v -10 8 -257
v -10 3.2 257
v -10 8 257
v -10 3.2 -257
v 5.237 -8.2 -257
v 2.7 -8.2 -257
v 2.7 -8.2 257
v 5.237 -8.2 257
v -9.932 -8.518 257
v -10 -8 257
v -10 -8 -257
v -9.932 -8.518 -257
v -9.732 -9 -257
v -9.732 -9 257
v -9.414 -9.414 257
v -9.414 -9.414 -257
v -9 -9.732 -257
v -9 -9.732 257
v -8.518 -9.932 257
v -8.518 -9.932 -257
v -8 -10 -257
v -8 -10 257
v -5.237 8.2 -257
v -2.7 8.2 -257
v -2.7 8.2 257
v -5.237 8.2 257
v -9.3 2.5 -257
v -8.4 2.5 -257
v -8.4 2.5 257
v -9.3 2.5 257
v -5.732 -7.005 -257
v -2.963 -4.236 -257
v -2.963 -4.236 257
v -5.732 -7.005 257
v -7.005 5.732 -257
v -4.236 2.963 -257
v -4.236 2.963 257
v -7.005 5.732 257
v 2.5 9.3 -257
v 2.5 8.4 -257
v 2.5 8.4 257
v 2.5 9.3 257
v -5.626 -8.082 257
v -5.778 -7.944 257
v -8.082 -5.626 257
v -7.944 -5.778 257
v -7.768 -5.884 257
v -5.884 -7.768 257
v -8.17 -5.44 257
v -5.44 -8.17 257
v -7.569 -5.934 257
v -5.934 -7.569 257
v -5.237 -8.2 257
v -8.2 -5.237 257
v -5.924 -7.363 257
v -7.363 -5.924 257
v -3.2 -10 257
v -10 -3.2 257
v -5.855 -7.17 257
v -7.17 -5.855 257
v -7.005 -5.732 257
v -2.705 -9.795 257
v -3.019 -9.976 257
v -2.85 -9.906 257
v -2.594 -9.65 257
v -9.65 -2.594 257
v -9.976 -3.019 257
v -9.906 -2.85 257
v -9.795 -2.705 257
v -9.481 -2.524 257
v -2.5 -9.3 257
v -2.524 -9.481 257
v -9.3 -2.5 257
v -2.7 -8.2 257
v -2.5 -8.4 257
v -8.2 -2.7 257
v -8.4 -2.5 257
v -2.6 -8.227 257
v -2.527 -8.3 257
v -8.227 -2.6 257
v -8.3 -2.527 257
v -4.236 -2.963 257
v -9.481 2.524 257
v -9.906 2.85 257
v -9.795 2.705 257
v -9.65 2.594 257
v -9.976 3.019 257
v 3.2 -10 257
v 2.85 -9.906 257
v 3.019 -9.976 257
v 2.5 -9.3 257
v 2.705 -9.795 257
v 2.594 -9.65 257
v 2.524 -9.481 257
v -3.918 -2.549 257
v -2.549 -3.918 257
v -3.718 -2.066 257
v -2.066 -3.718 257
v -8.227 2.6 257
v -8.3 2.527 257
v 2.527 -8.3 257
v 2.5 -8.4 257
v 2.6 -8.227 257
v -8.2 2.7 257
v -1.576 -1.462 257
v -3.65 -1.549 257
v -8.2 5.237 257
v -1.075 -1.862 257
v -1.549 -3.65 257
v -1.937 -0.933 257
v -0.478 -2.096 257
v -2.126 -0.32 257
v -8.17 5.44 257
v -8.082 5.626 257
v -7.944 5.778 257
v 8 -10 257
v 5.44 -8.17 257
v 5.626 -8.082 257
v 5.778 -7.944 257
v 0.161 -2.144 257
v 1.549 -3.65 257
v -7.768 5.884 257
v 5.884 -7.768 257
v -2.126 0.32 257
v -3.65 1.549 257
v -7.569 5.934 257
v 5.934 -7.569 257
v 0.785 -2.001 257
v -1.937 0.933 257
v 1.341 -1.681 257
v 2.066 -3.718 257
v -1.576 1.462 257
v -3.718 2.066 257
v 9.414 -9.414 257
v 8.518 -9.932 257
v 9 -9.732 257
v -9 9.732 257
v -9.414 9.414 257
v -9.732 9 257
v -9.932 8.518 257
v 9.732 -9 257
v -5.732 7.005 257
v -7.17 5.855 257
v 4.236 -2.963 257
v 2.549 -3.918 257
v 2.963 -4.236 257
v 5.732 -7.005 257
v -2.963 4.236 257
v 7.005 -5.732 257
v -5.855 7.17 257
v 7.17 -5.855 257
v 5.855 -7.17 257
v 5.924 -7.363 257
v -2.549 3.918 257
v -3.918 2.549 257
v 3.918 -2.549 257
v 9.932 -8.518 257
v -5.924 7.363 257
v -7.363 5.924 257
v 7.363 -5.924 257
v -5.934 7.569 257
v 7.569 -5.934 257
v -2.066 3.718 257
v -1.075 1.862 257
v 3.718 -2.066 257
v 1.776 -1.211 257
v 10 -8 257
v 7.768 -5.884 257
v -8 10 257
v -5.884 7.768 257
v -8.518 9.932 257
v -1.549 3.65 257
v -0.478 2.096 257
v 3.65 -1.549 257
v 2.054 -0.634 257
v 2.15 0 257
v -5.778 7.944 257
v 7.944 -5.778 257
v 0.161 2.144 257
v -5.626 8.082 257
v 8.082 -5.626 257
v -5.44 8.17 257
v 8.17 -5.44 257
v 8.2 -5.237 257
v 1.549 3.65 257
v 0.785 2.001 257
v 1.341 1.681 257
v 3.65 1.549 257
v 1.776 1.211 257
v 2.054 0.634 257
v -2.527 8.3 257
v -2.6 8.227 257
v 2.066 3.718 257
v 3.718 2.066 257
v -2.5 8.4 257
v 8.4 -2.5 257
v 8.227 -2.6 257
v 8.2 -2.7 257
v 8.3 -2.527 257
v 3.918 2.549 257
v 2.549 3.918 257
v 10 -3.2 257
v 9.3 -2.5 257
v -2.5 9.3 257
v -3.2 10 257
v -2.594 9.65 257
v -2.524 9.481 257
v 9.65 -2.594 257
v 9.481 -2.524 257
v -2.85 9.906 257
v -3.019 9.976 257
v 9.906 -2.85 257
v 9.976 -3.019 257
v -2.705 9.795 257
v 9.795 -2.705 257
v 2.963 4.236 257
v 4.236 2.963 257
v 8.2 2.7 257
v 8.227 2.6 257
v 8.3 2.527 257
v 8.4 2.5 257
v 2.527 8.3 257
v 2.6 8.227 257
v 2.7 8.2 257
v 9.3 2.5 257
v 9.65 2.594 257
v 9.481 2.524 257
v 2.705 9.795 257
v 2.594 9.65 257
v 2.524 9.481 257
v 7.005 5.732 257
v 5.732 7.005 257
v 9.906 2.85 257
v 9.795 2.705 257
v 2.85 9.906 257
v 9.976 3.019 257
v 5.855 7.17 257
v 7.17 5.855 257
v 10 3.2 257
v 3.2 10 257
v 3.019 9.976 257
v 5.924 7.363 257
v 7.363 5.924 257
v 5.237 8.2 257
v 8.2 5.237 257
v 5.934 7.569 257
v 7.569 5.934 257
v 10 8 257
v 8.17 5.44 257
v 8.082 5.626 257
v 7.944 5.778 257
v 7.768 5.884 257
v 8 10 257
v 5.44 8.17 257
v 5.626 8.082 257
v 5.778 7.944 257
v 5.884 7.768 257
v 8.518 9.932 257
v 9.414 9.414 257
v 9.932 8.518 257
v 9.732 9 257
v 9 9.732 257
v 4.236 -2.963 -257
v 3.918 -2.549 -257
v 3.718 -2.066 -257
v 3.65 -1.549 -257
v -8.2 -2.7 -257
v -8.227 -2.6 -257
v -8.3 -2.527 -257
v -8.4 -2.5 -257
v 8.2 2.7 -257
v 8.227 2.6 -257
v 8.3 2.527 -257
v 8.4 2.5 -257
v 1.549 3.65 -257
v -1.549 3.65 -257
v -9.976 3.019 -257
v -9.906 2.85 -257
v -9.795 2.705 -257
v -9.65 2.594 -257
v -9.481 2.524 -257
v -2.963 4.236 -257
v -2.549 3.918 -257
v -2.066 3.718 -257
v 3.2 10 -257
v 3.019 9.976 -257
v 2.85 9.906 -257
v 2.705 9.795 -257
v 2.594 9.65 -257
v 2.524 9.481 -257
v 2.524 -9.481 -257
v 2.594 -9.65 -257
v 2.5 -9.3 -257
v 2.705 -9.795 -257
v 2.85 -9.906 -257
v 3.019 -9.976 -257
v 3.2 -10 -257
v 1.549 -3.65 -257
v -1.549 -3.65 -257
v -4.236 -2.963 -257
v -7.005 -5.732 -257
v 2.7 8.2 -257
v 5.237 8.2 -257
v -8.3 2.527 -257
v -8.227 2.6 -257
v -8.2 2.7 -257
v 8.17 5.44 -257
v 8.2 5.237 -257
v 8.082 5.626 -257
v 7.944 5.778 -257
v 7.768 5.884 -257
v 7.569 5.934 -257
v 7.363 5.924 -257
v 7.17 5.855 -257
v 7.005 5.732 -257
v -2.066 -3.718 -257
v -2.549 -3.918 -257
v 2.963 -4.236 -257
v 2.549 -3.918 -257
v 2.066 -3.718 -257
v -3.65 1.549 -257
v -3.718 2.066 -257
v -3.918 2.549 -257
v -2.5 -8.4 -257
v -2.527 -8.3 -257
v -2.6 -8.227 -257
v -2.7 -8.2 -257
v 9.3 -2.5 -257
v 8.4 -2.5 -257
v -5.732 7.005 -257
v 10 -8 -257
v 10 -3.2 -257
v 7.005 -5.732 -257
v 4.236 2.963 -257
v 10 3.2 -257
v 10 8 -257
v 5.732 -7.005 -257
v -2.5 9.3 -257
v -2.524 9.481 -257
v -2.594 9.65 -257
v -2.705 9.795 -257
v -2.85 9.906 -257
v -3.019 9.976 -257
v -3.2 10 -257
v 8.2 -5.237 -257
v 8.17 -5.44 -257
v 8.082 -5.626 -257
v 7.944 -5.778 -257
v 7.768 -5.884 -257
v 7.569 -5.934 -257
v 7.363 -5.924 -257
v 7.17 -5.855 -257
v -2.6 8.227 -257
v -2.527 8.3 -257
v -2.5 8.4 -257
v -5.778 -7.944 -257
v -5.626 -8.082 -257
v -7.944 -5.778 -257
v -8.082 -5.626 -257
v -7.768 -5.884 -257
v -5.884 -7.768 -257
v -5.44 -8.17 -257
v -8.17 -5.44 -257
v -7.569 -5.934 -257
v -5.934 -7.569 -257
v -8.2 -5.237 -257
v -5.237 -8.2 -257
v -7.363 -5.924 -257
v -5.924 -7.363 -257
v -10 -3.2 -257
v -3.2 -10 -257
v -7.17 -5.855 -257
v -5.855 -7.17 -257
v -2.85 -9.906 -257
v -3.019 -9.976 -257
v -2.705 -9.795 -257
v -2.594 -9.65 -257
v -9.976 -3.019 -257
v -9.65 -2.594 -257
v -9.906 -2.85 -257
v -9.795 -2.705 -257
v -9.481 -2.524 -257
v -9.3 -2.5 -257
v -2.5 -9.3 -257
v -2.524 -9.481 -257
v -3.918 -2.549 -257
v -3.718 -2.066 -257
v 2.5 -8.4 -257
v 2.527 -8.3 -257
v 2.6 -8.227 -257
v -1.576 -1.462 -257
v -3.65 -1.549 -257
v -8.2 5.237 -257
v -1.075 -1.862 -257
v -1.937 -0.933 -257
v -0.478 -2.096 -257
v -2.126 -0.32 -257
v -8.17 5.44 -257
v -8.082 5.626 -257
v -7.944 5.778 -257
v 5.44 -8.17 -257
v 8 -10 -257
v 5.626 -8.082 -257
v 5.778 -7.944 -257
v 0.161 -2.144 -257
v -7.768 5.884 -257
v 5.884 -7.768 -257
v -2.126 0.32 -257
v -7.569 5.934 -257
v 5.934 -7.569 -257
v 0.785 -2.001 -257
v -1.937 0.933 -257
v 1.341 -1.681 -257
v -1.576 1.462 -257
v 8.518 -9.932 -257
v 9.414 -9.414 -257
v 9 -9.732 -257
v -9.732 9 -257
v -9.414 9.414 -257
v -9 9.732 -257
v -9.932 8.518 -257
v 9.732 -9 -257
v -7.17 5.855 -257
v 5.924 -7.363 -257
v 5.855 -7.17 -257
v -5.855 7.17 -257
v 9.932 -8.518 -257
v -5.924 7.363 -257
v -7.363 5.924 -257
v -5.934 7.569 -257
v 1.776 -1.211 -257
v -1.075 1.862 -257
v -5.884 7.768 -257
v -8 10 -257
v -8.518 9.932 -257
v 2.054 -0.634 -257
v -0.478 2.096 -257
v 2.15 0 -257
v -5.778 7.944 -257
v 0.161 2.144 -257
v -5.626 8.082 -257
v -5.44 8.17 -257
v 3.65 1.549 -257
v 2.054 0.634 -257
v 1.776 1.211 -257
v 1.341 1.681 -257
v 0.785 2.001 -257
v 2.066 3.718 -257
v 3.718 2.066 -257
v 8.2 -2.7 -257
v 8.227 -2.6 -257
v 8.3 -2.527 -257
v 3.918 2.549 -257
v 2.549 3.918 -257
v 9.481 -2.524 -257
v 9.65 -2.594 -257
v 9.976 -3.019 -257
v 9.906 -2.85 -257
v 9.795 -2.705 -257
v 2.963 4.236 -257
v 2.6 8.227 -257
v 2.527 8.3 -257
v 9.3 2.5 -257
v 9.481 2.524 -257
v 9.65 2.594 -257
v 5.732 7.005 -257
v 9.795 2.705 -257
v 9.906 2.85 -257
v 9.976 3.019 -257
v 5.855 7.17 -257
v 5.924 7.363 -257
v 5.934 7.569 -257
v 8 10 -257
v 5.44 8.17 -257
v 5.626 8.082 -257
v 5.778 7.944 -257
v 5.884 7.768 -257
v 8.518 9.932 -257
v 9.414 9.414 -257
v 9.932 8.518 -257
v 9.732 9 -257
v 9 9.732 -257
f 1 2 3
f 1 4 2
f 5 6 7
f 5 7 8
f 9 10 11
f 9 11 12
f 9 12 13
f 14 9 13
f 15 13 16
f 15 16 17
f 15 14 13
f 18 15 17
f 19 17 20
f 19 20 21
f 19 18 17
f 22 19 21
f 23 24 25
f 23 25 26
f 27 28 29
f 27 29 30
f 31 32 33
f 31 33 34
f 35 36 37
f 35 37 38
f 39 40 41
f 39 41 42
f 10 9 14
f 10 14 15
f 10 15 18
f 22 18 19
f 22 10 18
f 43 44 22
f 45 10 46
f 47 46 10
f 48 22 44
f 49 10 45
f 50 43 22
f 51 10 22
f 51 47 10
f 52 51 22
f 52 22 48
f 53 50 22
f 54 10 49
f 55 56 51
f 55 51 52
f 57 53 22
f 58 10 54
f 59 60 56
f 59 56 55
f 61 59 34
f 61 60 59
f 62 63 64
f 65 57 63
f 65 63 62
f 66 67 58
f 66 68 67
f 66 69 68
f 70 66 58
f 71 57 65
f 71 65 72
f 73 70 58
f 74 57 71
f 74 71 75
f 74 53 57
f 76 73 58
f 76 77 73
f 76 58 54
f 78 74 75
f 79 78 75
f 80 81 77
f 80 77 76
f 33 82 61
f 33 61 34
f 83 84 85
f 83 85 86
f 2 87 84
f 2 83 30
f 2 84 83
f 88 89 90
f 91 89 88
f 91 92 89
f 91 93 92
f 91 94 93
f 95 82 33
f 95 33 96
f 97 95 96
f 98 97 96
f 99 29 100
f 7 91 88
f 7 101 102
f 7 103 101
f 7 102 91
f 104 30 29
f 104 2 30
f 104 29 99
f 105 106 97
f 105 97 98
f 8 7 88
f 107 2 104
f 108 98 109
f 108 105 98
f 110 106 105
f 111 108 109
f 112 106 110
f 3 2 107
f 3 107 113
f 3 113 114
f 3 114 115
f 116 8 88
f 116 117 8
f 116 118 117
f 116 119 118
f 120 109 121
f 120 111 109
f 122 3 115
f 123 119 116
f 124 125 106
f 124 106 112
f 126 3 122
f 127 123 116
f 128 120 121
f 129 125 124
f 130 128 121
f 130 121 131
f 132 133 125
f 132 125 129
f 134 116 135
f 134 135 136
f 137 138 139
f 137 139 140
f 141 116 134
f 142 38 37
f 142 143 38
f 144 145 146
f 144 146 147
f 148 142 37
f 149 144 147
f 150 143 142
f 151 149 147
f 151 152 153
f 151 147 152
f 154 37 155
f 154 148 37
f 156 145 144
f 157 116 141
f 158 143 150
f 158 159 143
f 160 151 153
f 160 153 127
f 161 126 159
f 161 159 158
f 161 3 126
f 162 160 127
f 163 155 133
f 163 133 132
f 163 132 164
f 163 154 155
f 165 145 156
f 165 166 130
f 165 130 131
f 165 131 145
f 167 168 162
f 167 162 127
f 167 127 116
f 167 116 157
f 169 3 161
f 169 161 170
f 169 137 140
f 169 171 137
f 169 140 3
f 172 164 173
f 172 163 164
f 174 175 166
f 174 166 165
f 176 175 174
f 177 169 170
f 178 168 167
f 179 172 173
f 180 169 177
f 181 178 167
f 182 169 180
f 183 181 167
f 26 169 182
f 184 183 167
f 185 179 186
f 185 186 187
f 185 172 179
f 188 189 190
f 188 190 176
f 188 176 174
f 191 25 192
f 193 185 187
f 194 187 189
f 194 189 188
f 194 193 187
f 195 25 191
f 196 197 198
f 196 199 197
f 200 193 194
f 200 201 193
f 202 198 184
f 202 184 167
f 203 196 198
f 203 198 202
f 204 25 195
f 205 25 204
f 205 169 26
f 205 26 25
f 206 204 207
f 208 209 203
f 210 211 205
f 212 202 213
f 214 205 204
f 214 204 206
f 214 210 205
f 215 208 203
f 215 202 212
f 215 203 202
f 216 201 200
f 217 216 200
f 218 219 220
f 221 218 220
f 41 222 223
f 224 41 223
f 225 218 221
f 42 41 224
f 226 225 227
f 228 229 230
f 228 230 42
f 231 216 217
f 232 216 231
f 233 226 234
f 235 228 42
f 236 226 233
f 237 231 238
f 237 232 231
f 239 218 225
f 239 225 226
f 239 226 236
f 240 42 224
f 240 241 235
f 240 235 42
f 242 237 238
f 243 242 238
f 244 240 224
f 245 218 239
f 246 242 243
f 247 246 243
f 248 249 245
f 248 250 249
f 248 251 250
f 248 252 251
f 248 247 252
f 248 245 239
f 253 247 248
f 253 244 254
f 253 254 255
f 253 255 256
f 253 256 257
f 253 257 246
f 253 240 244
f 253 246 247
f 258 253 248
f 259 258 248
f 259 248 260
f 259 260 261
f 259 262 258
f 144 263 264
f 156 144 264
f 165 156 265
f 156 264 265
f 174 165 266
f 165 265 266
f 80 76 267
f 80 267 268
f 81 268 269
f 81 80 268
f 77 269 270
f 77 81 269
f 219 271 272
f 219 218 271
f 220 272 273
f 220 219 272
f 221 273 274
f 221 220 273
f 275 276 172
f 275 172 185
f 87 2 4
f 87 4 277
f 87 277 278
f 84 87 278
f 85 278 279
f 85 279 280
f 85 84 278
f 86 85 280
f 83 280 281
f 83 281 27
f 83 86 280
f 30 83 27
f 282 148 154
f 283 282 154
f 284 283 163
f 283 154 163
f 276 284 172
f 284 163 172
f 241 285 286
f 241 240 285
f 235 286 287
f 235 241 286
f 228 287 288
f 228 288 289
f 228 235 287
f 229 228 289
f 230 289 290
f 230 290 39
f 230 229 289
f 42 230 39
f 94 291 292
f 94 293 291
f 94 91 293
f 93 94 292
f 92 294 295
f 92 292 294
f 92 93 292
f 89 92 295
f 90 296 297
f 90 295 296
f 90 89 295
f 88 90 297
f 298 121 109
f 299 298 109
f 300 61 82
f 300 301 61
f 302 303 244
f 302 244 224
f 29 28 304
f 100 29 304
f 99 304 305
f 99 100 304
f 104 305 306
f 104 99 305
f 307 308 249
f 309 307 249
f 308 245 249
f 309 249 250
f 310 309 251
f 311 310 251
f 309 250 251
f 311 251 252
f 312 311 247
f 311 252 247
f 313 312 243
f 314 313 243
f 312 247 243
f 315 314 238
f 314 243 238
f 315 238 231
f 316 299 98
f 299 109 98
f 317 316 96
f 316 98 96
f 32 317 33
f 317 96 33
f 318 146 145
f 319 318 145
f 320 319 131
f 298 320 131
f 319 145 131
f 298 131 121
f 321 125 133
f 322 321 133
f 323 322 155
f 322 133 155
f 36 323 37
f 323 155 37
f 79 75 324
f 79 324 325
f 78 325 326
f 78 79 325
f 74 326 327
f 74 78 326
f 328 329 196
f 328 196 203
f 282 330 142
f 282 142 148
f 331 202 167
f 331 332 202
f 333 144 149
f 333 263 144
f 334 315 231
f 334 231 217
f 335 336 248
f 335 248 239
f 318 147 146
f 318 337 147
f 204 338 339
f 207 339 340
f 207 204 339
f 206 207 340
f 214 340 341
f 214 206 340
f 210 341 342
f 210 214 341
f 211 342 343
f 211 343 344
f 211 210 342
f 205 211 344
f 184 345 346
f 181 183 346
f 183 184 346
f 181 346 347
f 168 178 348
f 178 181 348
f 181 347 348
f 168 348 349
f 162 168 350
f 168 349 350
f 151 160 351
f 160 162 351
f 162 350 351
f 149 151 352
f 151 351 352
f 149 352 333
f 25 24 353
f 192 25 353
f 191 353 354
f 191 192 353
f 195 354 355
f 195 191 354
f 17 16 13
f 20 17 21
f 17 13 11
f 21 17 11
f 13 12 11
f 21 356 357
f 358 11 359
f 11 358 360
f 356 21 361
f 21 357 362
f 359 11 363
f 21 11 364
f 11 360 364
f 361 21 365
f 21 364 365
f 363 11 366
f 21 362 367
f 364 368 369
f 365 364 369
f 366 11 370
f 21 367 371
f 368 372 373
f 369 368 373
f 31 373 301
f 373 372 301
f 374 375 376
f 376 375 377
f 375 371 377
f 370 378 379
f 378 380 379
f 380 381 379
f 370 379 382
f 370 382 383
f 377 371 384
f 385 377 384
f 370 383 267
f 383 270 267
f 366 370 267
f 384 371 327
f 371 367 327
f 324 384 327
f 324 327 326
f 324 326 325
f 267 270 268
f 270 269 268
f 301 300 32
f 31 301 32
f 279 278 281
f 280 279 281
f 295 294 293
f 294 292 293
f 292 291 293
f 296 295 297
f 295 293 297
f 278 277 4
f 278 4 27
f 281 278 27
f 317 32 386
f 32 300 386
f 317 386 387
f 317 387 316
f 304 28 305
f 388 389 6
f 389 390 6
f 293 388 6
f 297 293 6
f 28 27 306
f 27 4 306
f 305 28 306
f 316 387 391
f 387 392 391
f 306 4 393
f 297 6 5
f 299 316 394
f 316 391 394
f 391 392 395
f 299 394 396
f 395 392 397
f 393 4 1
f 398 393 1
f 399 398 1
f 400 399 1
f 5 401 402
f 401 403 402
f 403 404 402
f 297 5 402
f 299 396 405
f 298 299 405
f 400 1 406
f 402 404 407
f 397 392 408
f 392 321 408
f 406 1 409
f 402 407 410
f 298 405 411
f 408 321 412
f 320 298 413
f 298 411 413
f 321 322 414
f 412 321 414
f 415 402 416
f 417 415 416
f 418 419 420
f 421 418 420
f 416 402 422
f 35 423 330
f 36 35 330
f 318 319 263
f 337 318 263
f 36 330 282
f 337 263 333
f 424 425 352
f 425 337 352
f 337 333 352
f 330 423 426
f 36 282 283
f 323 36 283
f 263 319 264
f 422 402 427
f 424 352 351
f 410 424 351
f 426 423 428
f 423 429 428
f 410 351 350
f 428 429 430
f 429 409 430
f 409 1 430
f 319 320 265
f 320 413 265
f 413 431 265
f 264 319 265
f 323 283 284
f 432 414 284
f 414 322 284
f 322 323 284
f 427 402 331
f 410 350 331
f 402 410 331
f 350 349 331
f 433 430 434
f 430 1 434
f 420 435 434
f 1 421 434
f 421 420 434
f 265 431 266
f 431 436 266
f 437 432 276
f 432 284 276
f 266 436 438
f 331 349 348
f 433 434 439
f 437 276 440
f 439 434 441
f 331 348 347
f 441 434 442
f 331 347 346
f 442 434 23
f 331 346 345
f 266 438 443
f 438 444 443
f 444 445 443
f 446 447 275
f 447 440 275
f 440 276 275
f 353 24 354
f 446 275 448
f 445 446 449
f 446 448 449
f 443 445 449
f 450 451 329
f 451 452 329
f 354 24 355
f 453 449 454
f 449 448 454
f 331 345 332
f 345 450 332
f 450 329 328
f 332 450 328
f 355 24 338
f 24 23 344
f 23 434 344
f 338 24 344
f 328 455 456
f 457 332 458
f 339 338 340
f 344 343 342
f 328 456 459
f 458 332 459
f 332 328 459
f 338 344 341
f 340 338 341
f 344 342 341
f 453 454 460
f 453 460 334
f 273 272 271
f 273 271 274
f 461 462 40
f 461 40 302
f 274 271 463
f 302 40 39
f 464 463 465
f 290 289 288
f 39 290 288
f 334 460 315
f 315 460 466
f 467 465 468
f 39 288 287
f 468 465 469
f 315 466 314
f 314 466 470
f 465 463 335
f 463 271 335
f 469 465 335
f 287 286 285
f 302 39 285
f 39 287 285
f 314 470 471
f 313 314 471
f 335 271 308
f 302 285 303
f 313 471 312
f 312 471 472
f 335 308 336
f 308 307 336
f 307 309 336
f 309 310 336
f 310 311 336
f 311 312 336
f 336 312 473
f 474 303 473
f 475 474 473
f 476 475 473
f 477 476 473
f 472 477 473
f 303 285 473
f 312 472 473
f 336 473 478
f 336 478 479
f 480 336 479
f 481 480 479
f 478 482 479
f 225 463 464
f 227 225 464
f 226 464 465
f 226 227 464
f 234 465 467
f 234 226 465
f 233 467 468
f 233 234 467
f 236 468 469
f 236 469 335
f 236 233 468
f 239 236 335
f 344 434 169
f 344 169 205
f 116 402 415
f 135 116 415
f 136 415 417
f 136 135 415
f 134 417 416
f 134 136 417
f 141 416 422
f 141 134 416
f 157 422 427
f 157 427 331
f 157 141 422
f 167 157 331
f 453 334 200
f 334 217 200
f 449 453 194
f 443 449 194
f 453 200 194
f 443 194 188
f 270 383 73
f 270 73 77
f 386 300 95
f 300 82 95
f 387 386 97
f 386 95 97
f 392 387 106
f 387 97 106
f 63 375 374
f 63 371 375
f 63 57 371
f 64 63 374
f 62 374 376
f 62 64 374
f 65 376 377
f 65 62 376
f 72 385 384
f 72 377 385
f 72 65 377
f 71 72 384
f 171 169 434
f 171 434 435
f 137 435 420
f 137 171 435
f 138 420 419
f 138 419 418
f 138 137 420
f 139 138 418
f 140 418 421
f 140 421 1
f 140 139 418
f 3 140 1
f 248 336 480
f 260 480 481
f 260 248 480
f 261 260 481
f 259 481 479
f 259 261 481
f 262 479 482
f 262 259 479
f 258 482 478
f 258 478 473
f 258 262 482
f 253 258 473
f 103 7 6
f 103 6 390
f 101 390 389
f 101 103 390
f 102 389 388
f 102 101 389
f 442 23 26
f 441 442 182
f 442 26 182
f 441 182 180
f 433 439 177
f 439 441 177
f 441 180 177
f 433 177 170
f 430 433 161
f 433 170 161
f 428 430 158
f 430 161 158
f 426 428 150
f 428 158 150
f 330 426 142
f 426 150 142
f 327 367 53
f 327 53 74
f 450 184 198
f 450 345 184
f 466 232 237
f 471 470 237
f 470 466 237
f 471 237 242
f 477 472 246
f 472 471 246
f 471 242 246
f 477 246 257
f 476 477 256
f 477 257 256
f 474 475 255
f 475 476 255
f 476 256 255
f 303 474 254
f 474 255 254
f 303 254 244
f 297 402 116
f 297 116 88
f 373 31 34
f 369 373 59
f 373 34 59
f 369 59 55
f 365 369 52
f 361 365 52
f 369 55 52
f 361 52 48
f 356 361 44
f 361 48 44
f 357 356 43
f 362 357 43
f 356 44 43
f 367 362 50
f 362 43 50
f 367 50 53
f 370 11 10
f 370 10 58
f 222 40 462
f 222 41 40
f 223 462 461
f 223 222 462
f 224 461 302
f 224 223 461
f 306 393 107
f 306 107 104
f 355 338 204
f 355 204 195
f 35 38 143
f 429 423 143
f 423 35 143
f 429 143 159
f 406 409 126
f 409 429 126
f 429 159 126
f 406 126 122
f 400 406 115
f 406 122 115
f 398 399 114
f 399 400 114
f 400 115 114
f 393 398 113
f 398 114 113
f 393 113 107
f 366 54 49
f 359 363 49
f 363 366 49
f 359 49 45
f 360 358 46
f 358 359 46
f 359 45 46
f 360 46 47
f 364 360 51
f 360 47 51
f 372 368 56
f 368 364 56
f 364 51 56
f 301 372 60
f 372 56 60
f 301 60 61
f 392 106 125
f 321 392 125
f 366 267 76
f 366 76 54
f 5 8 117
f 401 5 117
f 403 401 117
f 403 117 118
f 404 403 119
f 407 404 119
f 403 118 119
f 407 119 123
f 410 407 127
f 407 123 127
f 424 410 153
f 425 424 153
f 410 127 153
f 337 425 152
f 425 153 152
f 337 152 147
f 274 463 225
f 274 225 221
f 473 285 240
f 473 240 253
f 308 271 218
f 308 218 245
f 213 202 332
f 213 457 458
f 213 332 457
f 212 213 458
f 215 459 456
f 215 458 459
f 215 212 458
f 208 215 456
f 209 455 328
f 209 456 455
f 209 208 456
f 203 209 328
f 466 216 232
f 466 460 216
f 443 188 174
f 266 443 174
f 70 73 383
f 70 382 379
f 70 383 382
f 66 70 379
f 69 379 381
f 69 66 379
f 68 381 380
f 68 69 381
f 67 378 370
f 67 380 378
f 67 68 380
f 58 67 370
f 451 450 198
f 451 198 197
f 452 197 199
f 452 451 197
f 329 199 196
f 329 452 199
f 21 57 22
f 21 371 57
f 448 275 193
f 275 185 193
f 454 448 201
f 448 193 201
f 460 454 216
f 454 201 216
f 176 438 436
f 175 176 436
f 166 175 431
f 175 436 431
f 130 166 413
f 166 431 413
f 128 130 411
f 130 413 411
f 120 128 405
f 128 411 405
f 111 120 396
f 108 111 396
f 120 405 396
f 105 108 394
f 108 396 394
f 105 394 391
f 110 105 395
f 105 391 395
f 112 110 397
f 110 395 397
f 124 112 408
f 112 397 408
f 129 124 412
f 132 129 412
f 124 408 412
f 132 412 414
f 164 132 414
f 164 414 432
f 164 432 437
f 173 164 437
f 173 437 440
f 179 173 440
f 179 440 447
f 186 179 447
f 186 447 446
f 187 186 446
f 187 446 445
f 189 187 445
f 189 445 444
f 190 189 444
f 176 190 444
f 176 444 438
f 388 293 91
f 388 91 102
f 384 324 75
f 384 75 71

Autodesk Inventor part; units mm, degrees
ref_plane "YZ Plane" through (0, 0, 0) normal (1, 0, 0) x (0, 1, 0)
ref_plane "XZ Plane" through (0, 0, 0) normal (0, 1, 0) x (-1, 0, 0)
ref_plane "XY Plane" through (0, 0, 0) normal (0, 0, 1) x (1, 0, 0)
sketch "Sketch1" plane through (0, 0, 0) normal (0, 0, 1) x (1, 0, 0)
  circle A0 centre (0, 0) radius 2.15
  line L0 (-10, 10) -> (-2.5, 10)
  line L1 (-2.5, 10) -> (-2.5, 8.2)
  line L2 (-2.5, 8.2) -> (-6.9272, 8.2)
  line L3 (-6.9272, 8.2) -> (-2.3772, 3.65)
  line L4 (-2.3772, 3.65) -> (2.3772, 3.65)
  line L5 (2.3772, 3.65) -> (6.9272, 8.2)
  line L6 (6.9272, 8.2) -> (2.5, 8.2)
  line L7 (2.5, 8.2) -> (2.5, 10)
  line L8 (2.5, 10) -> (10, 10)
  line L9 (10, 10) -> (10, 2.5)
  line L10 (10, 2.5) -> (8.2, 2.5)
  line L11 (8.2, 2.5) -> (8.2, 6.9272)
  line L12 (8.2, 6.9272) -> (3.65, 2.3772)
  line L13 (3.65, 2.3772) -> (3.65, -2.3772)
  line L14 (3.65, -2.3772) -> (8.2, -6.9272)
  line L15 (8.2, -6.9272) -> (8.2, -2.5)
  line L16 (8.2, -2.5) -> (10, -2.5)
  line L17 (10, -2.5) -> (10, -10)
  line L18 (10, -10) -> (2.5, -10)
  line L19 (2.5, -10) -> (2.5, -8.2)
  line L20 (2.5, -8.2) -> (6.9272, -8.2)
  line L21 (6.9272, -8.2) -> (2.3772, -3.65)
  line L22 (2.3772, -3.65) -> (-2.3772, -3.65)
  line L23 (-2.3772, -3.65) -> (-6.9272, -8.2)
  line L24 (-6.9272, -8.2) -> (-2.5, -8.2)
  line L25 (-2.5, -8.2) -> (-2.5, -10)
  line L26 (-2.5, -10) -> (-10, -10)
  line L27 (-10, -10) -> (-10, -2.5)
  line L28 (-10, -2.5) -> (-8.2, -2.5)
  line L29 (-8.2, -2.5) -> (-8.2, -6.9272)
  line L30 (-8.2, -6.9272) -> (-3.65, -2.3772)
  line L31 (-3.65, -2.3772) -> (-3.65, 2.3772)
  line L32 (-3.65, 2.3772) -> (-8.2, 6.9272)
  line L33 (-8.2, 6.9272) -> (-8.2, 2.5)
  line L34 (-8.2, 2.5) -> (-10, 2.5)
  line L35 (-10, 2.5) -> (-10, 10)
  line L36 (0, 0) -> (-30.8654, 30.8654)
  line L37 (0, 0) -> (30.8654, 30.8654)
  line L38 (0, 0) -> (42.5392, 0)
  line L39 (0, 0) -> (0, 44.3419)
  dimension "d0" = 45
  dimension "d1" = 90
  dimension "Breite" = 20
  dimension "Tiefe_Schiene" = 6.35
  dimension "d2" = 1.8
  dimension "Durchmesser_Loch" = 4.3
  dimension "Wandstaerke" = 1.8
  dimension "d3" = 1.8
  dimension "Breite_Schiene" = 5
  dimension "d4" = 5
extrude "Extrusion1" add sketch "Sketch1" along normal mid plane 514 contours L38 L13 L14 L15 L16 L17 L18 L19 L20 L21 L22 L23 L24 L25 L26 L27 L28 L29 L30 L31 L32 L33 L34 L35 L36 A0 | A0 L37 L9 L10 L11 L12 L13 L38 | A0 L39 L4 L5 L6 L7 L8 L37 | L36 L0 L1 L2 L3 L4 L39 A0
fillet "Fillet1" radius 2 4 edges at (10, 10, 0) (-10, 10, 0) (10, -10, 0) (-10, -10, 0)
fillet "Fillet2" radius 0.2 8 edges at (-2.5, 8.2, 0) (2.5, 8.2, 0) (8.2, 2.5, 0) (8.2, -2.5, 0) (-2.5, -8.2, 0) (-8.2, -2.5, 0) (-8.2, 2.5, 0) (2.5, -8.2, 0)
fillet "Fillet3" radius 0.7 16 edges at (-2.5, 10, 0) (2.5, 10, 0) (10, 2.5, 0) (10, -2.5, 0) (2.5, -10, 0) (-2.5, -10, 0) (-10, -2.5, 0) (-10, 2.5, 0) (-6.9272, -8.2, 0) (-8.2, -6.9272, 0) (6.9272, -8.2, 0) (8.2, -6.9272, 0) (8.2, 6.9272, 0) (6.9272, 8.2, 0) (-6.9272, 8.2, 0) (-8.2, 6.9272, 0)
fillet "Fillet4" radius 2 8 edges at (-3.65, 2.3772, 0) (-2.3772, 3.65, 0) (2.3772, 3.65, 0) (3.65, 2.3772, 0) (3.65, -2.3772, 0) (2.3772, -3.65, 0) (-2.3772, -3.65, 0) (-3.65, -2.3772, 0)
equation "\"d2\" = Wandstaerke"
equation "\"d3\" = Wandstaerke"
equation "\"d4\" = Breite_Schiene"
properties part number "502.002.01_ITEM_20x20_514mm"
